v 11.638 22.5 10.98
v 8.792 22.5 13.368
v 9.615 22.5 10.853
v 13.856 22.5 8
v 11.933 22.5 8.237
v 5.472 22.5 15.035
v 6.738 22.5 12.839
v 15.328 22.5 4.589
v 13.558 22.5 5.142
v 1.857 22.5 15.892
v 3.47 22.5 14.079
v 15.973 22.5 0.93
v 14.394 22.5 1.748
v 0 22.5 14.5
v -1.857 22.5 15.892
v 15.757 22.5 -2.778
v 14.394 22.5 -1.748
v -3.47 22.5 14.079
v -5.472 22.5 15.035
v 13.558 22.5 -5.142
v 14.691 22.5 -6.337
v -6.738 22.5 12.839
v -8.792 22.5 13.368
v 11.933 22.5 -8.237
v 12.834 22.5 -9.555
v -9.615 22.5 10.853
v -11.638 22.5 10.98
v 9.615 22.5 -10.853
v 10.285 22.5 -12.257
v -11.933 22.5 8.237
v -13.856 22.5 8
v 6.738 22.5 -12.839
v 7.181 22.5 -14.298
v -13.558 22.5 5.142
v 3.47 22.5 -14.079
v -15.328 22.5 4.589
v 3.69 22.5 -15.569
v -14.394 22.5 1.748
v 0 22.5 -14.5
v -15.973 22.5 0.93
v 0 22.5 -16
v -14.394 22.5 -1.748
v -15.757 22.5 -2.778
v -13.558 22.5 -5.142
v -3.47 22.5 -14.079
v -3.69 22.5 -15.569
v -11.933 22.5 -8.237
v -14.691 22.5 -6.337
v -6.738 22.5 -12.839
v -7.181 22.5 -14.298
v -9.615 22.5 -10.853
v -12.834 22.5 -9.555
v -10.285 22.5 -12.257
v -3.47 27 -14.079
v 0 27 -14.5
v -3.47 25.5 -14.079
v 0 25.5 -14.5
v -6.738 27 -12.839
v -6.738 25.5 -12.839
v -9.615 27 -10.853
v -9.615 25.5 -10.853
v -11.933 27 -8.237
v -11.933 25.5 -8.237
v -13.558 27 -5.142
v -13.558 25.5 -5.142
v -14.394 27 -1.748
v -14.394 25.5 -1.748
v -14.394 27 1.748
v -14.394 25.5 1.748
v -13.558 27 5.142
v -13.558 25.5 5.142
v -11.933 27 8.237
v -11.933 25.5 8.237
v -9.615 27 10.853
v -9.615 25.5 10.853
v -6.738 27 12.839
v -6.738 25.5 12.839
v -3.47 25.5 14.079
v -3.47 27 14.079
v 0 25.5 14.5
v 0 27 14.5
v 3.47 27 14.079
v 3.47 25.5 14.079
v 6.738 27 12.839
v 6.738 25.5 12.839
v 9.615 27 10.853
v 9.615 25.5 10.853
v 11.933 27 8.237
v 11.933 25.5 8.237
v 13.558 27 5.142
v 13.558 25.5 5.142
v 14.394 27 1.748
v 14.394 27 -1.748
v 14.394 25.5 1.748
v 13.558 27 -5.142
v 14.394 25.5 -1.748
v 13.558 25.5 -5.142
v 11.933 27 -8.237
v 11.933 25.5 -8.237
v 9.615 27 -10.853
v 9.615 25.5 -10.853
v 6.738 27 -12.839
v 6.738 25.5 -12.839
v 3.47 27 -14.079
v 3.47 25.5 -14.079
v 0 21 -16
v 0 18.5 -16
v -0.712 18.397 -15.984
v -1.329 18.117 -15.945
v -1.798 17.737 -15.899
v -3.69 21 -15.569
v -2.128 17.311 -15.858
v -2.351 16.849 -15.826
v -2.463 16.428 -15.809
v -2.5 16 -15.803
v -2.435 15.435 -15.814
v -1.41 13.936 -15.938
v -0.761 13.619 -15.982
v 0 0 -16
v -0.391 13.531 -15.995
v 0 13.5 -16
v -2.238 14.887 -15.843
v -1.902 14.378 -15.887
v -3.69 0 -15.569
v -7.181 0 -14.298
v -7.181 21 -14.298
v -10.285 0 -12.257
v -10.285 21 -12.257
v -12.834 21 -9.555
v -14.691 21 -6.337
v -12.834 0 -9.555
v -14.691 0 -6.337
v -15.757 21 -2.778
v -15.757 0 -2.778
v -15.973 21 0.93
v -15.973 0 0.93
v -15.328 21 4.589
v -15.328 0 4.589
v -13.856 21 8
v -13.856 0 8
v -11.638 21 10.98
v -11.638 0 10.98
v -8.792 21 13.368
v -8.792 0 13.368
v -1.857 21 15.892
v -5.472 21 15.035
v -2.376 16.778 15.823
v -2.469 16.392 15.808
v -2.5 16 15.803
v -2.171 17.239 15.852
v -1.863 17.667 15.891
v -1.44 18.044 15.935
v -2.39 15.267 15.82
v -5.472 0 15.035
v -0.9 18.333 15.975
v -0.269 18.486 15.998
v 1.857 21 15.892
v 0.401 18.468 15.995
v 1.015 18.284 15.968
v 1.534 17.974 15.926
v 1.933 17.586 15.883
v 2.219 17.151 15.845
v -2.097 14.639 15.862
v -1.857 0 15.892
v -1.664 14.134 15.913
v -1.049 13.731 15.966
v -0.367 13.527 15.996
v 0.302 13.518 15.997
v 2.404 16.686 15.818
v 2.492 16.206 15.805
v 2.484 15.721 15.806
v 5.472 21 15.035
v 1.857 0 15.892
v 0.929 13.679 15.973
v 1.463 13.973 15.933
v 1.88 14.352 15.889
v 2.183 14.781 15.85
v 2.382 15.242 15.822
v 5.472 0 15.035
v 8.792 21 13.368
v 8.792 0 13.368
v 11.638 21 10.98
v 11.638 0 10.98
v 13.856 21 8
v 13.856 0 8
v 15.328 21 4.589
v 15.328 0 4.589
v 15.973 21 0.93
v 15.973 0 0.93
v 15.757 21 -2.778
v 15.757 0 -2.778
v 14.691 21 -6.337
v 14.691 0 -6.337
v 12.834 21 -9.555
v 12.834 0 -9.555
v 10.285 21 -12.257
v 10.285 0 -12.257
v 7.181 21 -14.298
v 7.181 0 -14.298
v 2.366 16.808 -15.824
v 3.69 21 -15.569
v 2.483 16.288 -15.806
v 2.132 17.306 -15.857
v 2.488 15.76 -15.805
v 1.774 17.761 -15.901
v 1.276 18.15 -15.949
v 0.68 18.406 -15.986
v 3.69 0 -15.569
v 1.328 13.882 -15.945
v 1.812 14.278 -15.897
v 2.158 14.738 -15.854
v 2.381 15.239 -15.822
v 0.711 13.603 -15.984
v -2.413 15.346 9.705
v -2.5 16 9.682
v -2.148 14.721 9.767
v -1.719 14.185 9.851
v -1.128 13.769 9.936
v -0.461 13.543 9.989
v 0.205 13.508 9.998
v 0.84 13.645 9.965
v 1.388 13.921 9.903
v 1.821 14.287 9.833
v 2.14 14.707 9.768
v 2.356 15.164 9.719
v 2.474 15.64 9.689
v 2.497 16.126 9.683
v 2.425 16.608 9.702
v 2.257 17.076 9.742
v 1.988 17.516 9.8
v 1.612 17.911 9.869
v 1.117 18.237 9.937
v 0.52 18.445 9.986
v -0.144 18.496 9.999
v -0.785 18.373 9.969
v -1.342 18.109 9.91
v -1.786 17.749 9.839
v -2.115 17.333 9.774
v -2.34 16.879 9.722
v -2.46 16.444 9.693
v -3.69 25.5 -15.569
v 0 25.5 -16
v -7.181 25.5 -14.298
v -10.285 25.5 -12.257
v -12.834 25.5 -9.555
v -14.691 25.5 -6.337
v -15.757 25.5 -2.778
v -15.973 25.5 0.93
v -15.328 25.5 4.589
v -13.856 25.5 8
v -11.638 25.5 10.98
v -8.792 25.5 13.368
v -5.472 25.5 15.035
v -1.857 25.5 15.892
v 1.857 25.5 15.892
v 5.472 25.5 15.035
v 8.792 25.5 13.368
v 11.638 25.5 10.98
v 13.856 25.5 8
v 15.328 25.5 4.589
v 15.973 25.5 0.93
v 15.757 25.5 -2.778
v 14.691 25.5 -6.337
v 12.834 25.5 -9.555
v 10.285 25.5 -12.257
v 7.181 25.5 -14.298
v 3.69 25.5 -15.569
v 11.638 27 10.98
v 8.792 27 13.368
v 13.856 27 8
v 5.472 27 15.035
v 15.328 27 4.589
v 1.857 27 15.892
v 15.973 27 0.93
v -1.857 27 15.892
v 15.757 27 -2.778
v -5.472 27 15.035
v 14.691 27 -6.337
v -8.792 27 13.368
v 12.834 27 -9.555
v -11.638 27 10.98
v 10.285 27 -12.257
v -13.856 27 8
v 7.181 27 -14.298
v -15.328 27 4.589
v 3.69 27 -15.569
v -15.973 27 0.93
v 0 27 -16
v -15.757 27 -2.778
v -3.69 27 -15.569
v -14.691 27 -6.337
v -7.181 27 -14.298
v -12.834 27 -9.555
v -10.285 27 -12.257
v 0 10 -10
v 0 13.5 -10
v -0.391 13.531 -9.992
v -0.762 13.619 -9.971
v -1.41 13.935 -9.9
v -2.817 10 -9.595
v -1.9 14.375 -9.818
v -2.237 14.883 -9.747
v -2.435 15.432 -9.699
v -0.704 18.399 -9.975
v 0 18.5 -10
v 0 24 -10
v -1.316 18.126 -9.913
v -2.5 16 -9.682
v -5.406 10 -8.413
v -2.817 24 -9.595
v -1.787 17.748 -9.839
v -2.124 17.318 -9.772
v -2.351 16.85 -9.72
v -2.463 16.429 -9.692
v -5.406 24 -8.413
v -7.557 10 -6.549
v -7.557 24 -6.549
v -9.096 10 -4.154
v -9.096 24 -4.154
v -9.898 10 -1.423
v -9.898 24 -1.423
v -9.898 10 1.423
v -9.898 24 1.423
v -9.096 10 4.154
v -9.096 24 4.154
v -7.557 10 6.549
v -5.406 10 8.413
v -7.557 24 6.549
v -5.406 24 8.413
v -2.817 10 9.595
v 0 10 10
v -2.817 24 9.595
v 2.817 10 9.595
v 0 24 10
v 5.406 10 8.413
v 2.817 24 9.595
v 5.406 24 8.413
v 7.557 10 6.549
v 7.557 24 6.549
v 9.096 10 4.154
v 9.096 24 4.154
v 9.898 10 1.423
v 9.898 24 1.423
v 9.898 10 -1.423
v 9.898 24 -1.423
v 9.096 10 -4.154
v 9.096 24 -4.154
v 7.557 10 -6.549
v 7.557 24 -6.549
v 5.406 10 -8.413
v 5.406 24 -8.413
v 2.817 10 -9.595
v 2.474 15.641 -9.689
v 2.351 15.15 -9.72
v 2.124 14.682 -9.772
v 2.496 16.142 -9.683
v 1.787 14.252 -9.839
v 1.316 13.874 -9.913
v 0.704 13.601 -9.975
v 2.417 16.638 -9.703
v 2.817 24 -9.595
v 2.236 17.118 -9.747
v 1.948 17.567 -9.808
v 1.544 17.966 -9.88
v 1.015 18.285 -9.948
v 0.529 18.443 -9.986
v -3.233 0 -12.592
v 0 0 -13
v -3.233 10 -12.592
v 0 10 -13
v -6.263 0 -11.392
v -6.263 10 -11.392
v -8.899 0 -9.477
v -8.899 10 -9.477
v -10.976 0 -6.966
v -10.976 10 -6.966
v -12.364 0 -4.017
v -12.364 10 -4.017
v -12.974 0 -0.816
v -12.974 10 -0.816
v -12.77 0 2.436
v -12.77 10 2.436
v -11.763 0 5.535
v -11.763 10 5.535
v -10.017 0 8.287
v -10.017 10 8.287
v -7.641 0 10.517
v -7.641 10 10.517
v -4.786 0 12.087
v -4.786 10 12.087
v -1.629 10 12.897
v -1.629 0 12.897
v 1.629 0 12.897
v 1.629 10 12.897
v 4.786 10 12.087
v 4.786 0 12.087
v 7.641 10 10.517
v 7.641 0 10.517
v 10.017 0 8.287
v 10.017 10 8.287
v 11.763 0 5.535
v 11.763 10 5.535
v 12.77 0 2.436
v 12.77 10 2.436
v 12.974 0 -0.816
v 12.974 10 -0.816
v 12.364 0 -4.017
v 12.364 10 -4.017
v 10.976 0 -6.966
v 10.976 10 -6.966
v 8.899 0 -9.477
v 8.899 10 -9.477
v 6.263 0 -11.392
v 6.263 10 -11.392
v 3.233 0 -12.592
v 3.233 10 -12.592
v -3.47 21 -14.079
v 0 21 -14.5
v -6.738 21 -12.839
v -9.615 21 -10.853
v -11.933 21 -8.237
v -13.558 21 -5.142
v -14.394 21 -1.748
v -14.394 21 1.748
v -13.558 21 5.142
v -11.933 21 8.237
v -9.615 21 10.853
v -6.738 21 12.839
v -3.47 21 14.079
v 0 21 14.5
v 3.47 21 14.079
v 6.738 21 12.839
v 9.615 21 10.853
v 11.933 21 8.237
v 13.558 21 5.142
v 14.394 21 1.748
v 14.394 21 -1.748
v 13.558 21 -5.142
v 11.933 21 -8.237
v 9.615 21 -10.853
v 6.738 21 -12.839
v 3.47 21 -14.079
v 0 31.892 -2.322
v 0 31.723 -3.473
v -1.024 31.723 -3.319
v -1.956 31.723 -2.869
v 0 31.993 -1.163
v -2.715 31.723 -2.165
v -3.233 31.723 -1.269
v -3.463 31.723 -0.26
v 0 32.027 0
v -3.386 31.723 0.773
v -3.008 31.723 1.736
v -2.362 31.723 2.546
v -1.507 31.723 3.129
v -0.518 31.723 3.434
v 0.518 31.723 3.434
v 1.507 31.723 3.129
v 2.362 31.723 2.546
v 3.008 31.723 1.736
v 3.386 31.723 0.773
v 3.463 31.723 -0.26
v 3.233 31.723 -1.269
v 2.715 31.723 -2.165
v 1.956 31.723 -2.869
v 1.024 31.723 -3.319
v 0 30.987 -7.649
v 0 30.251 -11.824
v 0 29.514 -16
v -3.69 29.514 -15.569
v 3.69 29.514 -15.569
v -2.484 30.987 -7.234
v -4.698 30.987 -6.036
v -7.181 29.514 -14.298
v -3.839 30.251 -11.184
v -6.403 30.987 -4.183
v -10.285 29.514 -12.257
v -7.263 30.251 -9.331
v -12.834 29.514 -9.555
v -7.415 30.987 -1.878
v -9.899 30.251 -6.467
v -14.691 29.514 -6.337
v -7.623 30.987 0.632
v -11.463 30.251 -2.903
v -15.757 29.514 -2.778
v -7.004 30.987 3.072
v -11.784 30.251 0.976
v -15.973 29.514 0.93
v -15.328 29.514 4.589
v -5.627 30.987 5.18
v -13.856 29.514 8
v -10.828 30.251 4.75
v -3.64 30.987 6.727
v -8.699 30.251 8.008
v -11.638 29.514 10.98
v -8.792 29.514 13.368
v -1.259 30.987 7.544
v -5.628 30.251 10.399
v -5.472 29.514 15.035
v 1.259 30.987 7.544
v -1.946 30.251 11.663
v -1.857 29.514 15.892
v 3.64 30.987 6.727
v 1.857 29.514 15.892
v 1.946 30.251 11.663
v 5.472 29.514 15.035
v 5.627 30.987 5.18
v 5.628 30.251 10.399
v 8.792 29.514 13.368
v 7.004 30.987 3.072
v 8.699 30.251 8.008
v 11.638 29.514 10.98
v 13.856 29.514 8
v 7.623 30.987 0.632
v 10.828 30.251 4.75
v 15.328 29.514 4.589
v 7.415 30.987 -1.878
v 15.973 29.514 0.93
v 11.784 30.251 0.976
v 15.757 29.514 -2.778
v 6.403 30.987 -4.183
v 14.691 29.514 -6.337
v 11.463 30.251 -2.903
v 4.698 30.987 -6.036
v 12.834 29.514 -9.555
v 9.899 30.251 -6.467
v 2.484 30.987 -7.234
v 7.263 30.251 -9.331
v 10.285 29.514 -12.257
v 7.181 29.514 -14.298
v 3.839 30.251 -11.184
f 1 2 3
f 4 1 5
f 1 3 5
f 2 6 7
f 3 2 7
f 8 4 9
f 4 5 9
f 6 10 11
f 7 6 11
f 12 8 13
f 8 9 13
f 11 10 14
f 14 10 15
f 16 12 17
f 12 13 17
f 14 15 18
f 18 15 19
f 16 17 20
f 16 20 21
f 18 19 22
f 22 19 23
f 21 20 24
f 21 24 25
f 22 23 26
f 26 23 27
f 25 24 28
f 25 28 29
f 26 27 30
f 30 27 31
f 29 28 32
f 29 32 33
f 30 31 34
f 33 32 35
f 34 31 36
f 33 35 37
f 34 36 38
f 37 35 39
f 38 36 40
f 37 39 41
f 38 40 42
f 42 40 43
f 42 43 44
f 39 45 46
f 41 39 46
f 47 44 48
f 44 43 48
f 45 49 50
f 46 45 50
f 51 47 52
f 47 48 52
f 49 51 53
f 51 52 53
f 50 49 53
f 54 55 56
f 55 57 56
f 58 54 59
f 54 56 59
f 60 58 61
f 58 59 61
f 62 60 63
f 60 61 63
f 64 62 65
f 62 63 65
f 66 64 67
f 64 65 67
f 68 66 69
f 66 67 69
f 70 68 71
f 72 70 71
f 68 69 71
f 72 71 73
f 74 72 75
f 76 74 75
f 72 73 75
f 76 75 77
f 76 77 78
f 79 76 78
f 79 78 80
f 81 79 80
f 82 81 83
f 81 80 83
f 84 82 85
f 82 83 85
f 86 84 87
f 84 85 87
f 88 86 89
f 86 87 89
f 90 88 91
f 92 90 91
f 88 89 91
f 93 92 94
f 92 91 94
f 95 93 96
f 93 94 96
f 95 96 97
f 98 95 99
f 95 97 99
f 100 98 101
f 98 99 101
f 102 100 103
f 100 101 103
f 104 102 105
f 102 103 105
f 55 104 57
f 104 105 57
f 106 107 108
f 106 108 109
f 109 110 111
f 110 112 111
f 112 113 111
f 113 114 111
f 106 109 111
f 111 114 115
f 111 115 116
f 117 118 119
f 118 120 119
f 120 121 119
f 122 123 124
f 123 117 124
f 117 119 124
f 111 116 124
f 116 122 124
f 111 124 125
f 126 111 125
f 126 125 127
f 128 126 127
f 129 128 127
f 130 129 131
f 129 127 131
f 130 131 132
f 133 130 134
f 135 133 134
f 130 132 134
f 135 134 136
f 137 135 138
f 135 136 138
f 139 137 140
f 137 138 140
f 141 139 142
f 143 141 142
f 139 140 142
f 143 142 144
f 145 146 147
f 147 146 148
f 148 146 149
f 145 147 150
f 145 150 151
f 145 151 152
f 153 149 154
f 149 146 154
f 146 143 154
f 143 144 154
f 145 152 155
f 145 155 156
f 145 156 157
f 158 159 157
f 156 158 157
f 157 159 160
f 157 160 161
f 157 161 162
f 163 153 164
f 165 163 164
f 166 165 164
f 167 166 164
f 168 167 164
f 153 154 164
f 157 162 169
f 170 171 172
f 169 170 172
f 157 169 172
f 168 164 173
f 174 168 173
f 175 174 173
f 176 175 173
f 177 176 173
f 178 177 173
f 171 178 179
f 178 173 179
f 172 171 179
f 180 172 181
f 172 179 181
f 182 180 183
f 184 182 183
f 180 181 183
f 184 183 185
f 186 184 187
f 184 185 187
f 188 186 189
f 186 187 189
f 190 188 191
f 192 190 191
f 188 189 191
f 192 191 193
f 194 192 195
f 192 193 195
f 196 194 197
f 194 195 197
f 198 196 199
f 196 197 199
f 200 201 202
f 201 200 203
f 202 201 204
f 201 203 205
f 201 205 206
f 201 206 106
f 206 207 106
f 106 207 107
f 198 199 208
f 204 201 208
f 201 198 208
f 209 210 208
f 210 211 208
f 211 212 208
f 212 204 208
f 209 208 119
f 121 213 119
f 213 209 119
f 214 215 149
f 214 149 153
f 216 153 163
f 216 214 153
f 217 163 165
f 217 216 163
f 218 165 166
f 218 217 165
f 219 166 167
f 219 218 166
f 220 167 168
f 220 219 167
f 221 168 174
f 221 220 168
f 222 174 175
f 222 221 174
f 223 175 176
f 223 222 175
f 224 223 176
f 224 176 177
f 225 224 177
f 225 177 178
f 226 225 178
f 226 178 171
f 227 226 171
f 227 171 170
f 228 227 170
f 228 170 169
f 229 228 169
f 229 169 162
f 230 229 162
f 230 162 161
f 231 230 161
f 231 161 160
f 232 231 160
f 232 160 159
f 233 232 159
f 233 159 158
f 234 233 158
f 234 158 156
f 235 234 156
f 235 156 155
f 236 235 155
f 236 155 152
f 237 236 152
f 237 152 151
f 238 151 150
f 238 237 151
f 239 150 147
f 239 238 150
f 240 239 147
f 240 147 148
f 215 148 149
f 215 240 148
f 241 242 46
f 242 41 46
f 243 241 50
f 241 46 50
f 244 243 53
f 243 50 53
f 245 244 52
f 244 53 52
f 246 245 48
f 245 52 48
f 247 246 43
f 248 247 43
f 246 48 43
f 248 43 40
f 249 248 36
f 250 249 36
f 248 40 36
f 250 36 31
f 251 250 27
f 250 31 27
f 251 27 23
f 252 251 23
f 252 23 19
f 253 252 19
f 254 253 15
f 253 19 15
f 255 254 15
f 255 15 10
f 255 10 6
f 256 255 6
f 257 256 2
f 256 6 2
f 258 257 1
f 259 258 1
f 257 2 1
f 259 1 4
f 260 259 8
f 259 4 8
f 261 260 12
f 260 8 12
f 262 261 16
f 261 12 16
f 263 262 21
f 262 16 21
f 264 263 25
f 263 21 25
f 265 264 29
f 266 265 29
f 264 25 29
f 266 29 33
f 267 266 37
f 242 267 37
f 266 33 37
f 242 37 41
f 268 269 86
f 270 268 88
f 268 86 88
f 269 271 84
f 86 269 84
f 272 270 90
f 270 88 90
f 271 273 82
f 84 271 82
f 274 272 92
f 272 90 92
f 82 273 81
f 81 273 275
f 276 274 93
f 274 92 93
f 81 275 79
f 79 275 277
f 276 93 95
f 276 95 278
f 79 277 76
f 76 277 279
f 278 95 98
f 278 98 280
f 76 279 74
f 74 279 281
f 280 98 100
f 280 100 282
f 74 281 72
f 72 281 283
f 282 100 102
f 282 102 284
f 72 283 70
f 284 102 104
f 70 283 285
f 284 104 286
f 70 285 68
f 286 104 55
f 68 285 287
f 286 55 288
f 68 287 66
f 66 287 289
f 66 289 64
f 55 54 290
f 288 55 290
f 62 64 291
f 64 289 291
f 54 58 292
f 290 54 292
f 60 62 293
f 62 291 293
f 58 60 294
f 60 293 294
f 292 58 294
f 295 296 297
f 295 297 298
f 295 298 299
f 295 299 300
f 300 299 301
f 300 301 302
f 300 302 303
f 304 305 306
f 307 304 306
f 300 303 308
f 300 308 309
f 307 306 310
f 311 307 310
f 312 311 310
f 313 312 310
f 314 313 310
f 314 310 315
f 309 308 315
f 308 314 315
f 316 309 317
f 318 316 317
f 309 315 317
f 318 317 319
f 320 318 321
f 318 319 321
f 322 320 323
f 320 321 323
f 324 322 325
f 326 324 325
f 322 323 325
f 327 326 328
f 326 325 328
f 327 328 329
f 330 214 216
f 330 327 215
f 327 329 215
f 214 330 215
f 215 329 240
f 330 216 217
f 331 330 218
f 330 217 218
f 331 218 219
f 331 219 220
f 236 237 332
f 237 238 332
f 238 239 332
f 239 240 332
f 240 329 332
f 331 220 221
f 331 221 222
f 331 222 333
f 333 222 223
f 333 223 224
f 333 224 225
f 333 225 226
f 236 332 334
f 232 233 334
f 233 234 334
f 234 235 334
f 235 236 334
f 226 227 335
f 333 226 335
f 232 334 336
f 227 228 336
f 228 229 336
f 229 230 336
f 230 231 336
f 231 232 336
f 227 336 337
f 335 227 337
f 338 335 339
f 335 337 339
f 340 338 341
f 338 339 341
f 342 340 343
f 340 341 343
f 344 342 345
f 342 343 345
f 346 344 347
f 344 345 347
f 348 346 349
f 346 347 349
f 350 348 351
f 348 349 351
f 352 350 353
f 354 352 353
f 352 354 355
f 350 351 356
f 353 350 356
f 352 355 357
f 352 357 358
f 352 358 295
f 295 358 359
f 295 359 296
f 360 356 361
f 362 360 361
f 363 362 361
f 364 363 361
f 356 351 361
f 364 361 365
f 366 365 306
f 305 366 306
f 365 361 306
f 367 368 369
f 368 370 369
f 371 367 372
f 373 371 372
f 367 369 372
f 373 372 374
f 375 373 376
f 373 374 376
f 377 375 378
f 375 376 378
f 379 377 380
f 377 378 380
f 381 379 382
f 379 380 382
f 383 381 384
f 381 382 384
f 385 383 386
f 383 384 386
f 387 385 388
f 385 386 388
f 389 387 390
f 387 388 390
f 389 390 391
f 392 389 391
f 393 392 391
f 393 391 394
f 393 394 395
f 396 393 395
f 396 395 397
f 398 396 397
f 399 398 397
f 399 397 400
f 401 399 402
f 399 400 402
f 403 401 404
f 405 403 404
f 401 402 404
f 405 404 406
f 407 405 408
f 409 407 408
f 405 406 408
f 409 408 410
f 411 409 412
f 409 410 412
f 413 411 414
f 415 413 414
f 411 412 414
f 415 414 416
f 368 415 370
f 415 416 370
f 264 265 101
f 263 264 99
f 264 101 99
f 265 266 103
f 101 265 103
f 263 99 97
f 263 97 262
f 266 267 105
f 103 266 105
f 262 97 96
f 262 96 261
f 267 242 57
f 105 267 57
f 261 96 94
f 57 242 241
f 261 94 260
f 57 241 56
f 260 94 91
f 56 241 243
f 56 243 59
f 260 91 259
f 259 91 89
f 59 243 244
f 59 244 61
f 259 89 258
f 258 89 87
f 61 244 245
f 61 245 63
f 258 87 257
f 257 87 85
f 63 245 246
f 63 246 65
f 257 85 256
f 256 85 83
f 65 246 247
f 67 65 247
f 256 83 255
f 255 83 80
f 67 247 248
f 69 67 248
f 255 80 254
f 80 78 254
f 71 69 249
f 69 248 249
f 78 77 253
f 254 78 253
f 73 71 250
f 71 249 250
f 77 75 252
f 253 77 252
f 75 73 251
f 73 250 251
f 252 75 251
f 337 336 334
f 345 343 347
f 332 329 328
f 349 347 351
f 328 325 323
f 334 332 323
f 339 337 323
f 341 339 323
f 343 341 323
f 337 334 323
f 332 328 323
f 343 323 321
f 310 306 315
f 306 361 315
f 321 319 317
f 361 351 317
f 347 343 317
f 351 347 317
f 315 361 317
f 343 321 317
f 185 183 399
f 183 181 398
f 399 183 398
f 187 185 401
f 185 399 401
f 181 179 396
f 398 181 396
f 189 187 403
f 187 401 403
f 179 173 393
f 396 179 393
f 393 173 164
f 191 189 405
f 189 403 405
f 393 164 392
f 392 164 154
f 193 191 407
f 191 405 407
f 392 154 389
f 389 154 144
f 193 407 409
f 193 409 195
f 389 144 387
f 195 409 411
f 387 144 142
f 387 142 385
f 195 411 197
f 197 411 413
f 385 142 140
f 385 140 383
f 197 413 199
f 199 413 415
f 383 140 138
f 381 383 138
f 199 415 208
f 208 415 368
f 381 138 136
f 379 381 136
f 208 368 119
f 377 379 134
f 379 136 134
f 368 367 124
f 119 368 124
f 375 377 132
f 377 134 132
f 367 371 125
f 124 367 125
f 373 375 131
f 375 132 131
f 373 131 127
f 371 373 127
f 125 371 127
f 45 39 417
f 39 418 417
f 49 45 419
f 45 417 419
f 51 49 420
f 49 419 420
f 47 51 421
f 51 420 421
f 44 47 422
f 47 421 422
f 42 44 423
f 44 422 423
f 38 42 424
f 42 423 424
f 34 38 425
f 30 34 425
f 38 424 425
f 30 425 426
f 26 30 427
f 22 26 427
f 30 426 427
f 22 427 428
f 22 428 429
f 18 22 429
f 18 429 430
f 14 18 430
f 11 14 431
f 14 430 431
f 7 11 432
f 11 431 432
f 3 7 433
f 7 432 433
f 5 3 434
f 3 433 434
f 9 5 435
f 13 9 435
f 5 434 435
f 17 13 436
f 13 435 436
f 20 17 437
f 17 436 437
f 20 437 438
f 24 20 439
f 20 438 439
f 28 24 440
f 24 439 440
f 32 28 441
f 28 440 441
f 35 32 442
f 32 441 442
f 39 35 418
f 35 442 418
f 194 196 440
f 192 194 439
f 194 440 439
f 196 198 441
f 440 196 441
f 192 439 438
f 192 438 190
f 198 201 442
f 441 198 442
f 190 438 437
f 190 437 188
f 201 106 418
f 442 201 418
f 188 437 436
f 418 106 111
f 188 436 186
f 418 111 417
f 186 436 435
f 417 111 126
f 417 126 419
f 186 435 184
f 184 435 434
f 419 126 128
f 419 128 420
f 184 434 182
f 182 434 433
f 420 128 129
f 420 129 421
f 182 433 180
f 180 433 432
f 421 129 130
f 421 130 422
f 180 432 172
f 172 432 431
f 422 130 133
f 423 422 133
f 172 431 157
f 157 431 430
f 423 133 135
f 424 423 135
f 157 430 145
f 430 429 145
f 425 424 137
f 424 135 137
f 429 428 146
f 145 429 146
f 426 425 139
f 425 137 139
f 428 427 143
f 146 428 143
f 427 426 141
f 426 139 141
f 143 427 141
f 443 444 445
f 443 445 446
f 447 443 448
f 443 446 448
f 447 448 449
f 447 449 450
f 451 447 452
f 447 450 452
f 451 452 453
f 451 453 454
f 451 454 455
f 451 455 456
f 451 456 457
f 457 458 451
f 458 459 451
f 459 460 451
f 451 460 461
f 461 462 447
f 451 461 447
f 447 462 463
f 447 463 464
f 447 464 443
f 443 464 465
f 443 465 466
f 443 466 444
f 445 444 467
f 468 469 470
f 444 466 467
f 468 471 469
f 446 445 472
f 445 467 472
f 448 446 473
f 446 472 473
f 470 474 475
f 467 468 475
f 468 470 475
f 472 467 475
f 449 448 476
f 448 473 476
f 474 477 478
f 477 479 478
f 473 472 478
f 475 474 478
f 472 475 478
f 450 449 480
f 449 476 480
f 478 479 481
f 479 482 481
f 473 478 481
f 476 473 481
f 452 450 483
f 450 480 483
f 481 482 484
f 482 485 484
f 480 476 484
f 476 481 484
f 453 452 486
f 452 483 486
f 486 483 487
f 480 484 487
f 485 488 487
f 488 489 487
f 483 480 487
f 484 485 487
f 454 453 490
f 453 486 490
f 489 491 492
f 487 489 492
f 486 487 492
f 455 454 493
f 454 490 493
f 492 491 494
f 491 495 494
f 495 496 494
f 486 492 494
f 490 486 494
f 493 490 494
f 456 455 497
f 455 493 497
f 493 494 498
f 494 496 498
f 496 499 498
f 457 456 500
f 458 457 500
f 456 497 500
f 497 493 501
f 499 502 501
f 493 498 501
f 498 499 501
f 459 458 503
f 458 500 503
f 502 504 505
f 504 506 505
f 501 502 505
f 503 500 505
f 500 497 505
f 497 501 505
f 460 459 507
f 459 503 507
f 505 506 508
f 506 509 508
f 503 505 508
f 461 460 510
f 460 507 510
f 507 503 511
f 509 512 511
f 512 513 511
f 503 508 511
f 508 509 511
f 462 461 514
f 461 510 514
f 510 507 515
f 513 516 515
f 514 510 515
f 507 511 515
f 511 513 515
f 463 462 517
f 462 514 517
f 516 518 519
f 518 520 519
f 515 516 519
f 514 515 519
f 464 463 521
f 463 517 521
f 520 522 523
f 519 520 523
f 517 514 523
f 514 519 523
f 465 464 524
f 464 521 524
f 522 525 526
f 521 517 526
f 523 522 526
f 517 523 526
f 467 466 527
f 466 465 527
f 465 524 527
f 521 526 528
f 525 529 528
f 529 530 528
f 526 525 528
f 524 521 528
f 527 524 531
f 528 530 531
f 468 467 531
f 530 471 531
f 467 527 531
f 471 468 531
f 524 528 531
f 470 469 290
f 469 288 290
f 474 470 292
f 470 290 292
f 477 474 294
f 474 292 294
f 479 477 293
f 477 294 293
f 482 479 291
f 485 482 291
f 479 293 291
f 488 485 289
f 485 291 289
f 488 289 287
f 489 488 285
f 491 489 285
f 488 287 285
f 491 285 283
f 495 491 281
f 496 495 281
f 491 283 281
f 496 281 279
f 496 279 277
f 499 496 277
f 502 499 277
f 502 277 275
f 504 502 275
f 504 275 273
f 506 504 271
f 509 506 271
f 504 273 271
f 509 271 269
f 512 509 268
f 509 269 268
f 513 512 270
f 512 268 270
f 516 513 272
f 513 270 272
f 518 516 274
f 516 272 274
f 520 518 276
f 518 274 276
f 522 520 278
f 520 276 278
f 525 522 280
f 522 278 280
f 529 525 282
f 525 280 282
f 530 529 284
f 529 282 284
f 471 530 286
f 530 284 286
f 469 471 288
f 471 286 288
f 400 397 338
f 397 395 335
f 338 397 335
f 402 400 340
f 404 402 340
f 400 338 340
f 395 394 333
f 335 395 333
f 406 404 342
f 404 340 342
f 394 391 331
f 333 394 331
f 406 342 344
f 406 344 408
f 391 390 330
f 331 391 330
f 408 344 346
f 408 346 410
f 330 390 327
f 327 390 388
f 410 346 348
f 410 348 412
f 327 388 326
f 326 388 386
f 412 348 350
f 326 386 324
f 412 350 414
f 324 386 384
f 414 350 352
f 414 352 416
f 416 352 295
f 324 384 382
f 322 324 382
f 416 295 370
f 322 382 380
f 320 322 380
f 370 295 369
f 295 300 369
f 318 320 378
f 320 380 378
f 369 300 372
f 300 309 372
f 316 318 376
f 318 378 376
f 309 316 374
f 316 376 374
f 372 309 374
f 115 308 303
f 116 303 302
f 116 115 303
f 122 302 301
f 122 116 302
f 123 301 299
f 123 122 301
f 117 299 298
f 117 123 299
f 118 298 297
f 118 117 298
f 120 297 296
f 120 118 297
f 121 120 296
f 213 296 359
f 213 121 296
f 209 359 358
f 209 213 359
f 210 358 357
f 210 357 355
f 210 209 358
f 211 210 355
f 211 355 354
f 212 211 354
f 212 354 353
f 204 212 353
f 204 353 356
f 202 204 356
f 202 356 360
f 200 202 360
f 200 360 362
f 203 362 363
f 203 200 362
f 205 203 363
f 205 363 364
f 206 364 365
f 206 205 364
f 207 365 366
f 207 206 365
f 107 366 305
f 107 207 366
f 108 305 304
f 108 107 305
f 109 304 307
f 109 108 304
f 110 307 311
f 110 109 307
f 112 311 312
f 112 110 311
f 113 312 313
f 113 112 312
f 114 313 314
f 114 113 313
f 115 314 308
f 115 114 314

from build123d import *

# Parameters (mm, degrees)
CUT_EXTRUDE1_DEPTH      = 39
CUT_EXTRUDE1_DEPTH_BACK = 50
SKETCH2_R               = 2.5


with BuildPart() as part:
    # Sketch1 → Revolve2 (revolve)
    with BuildSketch(Plane.XY, mode=Mode.PRIVATE) as revolve2_sk:
        with BuildLine():
            Line((13, 0), (13, 10))
            Line((13, 10), (10, 10))
            Line((10, 10), (10, 24))
            Line((10, 24), (0, 24))
            Line((0, 24), (0, 32))
            Line((0, 32), (0, 32.027132664))
            ThreePointArc((0, 32.027132664), (1.743114855, 31.951026626), (3.472963553, 31.723287724))
            Line((3.472963553, 31.723287724), (16, 29.51443321))
            Line((16, 29.51443321), (16, 27))
            Line((16, 27), (14.5, 27))
            Line((14.5, 27), (14.5, 25.5))
            Line((14.5, 25.5), (16, 25.5))
            Line((16, 25.5), (16, 22.5))
            Line((16, 22.5), (14.5, 22.5))
            Line((14.5, 22.5), (14.5, 21))
            Line((14.5, 21), (16, 21))
            Line((16, 21), (16, 0))
            Line((16, 0), (13, 0))
        make_face()
    revolve(revolve2_sk.sketch.rotate(Axis((0, 0, 0), (0, 1, 0)), 90), axis=Axis((0, 0, 0), (0, 1, 0)))

    # Sketch2 → Cut-Extrude1 (cut, two sides: drawn at the far end of the back side and taken through both)
    with BuildSketch(Plane.XY.offset(-CUT_EXTRUDE1_DEPTH_BACK)):
        with Locations(Location((0, 16, 0), (0, 0, 180))):
            Circle(SKETCH2_R)
    extrude(amount=CUT_EXTRUDE1_DEPTH + CUT_EXTRUDE1_DEPTH_BACK, mode=Mode.SUBTRACT)


solid = part.part
